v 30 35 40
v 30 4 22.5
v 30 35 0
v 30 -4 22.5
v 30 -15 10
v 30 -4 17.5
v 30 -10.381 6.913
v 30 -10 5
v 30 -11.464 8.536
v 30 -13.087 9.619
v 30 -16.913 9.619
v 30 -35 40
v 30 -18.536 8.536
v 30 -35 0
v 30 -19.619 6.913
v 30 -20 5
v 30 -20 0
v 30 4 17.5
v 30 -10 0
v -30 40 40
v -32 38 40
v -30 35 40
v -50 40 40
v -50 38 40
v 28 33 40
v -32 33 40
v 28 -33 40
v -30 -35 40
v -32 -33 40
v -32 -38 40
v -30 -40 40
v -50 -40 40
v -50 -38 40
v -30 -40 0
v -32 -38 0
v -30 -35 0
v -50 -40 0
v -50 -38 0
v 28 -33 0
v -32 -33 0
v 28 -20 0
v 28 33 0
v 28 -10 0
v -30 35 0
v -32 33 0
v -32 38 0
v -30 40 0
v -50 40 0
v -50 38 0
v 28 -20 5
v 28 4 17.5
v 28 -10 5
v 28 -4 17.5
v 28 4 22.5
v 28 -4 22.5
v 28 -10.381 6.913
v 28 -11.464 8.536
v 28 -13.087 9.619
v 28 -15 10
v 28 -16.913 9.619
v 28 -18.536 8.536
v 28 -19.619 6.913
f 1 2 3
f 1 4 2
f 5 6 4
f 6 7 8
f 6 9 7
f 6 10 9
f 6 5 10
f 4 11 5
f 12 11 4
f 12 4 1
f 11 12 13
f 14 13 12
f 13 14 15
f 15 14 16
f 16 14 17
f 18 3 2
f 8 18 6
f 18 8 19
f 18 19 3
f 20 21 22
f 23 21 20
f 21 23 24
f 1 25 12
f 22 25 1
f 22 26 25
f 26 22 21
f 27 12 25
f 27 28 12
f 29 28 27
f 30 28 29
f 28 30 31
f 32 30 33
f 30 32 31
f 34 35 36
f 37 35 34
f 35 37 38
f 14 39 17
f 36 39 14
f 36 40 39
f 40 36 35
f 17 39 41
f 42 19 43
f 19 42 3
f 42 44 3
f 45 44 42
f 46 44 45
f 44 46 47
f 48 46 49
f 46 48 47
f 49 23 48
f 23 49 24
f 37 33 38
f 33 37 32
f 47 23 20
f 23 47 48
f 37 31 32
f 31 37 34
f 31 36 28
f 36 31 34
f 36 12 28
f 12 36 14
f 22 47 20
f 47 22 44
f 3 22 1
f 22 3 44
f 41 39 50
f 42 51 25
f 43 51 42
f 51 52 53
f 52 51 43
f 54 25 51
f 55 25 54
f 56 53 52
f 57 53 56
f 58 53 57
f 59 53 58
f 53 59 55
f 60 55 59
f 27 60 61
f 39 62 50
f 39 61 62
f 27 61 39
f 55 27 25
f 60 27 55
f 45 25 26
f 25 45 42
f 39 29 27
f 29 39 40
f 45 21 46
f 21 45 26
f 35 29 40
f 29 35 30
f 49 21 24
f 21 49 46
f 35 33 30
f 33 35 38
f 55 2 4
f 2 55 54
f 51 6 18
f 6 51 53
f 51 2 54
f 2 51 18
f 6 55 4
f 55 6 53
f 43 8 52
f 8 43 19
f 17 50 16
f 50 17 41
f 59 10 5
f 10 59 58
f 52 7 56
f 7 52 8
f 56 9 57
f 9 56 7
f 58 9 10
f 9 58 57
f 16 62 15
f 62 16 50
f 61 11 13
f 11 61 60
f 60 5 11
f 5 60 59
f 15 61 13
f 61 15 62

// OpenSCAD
module Vision_Capteur(pos_x, pos_y, pos_z)
{
    translate([ pos_x, pos_y, pos_z]) cube([5, 8, 5], true);
}

difference()
{
    // Base Chassis
    translate([-50, -40, 0]) cube([80, 80, 40]);
    
    // Passage Roues
    translate([0, -37.5, 20]) cube([60, 5, 40], true);
    translate([0,  37.5, 20]) cube([60, 5, 40], true);
    
    // Evidement interne
    translate([-7.5, 0, 20]) cube([71, 66, 40], true);
    translate([-42.5, 0, 20]) cube([21, 76, 40], true);
    
    // Vision Capteur
    Vision_Capteur(27.5, -0, 20);
    
    // Passage Batterie
    translate([27.5, -15, 0])cube([5, 10, 10], true);
    translate([27.5, -15, 5]) rotate(a = [0, 90,  0]) cylinder(h = 5, r = 5);
}   
